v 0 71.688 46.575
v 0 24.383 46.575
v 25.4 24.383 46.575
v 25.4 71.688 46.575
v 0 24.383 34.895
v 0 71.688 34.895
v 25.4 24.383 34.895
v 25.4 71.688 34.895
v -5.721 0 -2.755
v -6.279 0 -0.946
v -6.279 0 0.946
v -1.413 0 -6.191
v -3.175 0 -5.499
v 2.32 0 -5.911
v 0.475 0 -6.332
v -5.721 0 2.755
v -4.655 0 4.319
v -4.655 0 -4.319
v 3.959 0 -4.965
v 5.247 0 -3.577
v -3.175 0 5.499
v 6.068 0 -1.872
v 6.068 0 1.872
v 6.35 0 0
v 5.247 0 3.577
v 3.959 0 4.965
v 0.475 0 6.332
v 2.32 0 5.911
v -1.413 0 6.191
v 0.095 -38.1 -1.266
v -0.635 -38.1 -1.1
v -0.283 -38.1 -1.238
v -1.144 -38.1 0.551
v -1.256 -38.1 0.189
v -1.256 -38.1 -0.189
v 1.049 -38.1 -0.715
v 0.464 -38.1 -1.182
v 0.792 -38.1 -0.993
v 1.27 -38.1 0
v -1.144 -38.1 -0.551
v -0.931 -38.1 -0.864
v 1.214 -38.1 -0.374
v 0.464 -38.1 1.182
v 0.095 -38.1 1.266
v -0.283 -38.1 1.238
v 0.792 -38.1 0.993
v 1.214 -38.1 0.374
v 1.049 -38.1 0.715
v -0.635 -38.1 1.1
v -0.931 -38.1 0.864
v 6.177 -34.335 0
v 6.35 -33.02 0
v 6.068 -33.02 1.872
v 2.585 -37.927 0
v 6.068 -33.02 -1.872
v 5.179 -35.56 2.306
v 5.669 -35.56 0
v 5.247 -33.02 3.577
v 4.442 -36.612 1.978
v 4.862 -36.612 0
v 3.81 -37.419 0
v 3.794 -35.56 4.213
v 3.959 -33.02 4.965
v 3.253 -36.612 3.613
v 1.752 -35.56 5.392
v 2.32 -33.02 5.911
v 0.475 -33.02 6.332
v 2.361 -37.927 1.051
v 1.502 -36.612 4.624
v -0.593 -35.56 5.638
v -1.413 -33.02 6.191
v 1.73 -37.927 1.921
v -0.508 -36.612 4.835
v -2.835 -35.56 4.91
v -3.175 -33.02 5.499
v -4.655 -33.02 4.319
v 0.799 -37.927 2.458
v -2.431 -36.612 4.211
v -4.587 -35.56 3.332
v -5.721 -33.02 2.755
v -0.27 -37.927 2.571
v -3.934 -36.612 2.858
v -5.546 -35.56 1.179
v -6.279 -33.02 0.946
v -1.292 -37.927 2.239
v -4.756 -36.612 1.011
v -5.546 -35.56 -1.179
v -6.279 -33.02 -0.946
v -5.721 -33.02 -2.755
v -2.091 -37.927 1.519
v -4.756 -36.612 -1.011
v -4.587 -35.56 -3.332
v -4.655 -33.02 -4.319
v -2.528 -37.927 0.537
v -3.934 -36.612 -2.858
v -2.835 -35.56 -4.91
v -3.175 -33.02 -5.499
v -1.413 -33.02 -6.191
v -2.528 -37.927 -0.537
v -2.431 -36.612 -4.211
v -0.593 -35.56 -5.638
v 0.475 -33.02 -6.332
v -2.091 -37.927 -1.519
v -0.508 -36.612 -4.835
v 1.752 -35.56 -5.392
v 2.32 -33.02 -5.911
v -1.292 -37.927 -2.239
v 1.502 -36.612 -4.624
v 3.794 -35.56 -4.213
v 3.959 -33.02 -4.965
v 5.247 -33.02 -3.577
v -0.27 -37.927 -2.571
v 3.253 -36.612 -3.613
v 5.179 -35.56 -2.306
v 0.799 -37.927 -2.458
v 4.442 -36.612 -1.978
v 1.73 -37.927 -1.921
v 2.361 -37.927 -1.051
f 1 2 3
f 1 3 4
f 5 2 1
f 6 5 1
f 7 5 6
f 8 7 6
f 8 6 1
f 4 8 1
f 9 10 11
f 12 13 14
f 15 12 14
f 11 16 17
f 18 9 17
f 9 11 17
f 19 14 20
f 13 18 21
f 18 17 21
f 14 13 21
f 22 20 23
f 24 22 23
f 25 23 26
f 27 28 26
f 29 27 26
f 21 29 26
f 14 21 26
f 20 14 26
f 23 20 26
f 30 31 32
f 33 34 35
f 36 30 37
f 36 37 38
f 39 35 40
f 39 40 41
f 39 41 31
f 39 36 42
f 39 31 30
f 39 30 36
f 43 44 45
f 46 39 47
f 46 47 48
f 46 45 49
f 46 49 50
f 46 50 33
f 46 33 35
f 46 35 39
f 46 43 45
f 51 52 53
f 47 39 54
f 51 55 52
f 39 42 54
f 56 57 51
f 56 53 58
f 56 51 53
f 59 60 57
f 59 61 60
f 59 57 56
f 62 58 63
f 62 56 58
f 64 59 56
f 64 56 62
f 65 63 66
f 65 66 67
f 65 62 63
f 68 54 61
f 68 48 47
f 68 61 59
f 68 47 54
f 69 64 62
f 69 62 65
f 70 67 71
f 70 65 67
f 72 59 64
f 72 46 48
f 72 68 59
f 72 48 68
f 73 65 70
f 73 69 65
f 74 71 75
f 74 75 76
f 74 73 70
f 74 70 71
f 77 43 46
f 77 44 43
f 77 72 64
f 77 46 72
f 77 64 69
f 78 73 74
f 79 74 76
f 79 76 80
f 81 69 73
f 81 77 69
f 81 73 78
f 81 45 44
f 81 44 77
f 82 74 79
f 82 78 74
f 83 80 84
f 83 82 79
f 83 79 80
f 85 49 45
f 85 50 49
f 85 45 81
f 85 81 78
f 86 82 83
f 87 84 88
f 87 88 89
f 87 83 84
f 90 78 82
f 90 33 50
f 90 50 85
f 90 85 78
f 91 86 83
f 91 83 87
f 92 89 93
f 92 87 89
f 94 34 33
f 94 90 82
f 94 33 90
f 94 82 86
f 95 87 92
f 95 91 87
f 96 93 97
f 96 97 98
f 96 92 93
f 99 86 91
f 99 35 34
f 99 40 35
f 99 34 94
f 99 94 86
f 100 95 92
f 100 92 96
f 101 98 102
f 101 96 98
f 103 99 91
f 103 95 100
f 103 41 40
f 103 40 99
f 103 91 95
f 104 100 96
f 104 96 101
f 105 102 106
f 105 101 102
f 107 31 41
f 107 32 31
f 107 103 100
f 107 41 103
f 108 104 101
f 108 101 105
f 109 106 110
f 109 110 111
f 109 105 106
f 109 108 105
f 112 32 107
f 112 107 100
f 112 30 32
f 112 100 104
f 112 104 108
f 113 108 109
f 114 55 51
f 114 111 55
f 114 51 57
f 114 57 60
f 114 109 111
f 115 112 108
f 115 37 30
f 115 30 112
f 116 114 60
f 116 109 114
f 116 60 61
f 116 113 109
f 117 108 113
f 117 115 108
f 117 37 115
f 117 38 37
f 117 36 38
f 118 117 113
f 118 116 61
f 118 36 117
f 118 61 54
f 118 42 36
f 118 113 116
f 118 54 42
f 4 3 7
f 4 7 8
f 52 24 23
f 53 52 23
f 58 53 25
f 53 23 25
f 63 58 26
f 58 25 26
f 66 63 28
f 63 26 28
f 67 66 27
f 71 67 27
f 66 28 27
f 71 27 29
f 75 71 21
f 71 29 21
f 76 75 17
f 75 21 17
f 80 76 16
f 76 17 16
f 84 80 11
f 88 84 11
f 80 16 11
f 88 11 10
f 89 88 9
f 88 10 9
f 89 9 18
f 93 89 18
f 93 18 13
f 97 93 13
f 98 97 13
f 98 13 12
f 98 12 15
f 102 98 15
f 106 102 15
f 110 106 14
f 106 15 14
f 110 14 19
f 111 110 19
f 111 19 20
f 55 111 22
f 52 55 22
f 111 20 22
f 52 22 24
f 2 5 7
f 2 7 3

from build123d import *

# Parameters (mm, degrees)
F0_R     = 6.35
F1_DEPTH = 38.1
F2_R     = 5.08
F3_W     = 47.305185
F3_H     = 11.680291
F4_DEPTH = 25.4


with BuildPart() as f1:
    # F0 (on Front) → F1 (new body)
    with BuildSketch(Plane.XZ):
        Circle(F0_R)
    extrude(amount=F1_DEPTH)

    # F2
    f2_edges = [f1.edges().sort_by_distance(p)[0] for p in [
        (-6.35, -38.1, 0),
    ]]
    fillet(f2_edges, radius=F2_R)


with BuildPart() as f4:
    # F3 (on Right) → F4 (new body)
    with BuildSketch(Plane.YZ):
        with Locations((48.035202, 40.735017)):
            Rectangle(F3_W, F3_H)
    extrude(amount=F4_DEPTH)


solid = Compound([f1.part, f4.part])
